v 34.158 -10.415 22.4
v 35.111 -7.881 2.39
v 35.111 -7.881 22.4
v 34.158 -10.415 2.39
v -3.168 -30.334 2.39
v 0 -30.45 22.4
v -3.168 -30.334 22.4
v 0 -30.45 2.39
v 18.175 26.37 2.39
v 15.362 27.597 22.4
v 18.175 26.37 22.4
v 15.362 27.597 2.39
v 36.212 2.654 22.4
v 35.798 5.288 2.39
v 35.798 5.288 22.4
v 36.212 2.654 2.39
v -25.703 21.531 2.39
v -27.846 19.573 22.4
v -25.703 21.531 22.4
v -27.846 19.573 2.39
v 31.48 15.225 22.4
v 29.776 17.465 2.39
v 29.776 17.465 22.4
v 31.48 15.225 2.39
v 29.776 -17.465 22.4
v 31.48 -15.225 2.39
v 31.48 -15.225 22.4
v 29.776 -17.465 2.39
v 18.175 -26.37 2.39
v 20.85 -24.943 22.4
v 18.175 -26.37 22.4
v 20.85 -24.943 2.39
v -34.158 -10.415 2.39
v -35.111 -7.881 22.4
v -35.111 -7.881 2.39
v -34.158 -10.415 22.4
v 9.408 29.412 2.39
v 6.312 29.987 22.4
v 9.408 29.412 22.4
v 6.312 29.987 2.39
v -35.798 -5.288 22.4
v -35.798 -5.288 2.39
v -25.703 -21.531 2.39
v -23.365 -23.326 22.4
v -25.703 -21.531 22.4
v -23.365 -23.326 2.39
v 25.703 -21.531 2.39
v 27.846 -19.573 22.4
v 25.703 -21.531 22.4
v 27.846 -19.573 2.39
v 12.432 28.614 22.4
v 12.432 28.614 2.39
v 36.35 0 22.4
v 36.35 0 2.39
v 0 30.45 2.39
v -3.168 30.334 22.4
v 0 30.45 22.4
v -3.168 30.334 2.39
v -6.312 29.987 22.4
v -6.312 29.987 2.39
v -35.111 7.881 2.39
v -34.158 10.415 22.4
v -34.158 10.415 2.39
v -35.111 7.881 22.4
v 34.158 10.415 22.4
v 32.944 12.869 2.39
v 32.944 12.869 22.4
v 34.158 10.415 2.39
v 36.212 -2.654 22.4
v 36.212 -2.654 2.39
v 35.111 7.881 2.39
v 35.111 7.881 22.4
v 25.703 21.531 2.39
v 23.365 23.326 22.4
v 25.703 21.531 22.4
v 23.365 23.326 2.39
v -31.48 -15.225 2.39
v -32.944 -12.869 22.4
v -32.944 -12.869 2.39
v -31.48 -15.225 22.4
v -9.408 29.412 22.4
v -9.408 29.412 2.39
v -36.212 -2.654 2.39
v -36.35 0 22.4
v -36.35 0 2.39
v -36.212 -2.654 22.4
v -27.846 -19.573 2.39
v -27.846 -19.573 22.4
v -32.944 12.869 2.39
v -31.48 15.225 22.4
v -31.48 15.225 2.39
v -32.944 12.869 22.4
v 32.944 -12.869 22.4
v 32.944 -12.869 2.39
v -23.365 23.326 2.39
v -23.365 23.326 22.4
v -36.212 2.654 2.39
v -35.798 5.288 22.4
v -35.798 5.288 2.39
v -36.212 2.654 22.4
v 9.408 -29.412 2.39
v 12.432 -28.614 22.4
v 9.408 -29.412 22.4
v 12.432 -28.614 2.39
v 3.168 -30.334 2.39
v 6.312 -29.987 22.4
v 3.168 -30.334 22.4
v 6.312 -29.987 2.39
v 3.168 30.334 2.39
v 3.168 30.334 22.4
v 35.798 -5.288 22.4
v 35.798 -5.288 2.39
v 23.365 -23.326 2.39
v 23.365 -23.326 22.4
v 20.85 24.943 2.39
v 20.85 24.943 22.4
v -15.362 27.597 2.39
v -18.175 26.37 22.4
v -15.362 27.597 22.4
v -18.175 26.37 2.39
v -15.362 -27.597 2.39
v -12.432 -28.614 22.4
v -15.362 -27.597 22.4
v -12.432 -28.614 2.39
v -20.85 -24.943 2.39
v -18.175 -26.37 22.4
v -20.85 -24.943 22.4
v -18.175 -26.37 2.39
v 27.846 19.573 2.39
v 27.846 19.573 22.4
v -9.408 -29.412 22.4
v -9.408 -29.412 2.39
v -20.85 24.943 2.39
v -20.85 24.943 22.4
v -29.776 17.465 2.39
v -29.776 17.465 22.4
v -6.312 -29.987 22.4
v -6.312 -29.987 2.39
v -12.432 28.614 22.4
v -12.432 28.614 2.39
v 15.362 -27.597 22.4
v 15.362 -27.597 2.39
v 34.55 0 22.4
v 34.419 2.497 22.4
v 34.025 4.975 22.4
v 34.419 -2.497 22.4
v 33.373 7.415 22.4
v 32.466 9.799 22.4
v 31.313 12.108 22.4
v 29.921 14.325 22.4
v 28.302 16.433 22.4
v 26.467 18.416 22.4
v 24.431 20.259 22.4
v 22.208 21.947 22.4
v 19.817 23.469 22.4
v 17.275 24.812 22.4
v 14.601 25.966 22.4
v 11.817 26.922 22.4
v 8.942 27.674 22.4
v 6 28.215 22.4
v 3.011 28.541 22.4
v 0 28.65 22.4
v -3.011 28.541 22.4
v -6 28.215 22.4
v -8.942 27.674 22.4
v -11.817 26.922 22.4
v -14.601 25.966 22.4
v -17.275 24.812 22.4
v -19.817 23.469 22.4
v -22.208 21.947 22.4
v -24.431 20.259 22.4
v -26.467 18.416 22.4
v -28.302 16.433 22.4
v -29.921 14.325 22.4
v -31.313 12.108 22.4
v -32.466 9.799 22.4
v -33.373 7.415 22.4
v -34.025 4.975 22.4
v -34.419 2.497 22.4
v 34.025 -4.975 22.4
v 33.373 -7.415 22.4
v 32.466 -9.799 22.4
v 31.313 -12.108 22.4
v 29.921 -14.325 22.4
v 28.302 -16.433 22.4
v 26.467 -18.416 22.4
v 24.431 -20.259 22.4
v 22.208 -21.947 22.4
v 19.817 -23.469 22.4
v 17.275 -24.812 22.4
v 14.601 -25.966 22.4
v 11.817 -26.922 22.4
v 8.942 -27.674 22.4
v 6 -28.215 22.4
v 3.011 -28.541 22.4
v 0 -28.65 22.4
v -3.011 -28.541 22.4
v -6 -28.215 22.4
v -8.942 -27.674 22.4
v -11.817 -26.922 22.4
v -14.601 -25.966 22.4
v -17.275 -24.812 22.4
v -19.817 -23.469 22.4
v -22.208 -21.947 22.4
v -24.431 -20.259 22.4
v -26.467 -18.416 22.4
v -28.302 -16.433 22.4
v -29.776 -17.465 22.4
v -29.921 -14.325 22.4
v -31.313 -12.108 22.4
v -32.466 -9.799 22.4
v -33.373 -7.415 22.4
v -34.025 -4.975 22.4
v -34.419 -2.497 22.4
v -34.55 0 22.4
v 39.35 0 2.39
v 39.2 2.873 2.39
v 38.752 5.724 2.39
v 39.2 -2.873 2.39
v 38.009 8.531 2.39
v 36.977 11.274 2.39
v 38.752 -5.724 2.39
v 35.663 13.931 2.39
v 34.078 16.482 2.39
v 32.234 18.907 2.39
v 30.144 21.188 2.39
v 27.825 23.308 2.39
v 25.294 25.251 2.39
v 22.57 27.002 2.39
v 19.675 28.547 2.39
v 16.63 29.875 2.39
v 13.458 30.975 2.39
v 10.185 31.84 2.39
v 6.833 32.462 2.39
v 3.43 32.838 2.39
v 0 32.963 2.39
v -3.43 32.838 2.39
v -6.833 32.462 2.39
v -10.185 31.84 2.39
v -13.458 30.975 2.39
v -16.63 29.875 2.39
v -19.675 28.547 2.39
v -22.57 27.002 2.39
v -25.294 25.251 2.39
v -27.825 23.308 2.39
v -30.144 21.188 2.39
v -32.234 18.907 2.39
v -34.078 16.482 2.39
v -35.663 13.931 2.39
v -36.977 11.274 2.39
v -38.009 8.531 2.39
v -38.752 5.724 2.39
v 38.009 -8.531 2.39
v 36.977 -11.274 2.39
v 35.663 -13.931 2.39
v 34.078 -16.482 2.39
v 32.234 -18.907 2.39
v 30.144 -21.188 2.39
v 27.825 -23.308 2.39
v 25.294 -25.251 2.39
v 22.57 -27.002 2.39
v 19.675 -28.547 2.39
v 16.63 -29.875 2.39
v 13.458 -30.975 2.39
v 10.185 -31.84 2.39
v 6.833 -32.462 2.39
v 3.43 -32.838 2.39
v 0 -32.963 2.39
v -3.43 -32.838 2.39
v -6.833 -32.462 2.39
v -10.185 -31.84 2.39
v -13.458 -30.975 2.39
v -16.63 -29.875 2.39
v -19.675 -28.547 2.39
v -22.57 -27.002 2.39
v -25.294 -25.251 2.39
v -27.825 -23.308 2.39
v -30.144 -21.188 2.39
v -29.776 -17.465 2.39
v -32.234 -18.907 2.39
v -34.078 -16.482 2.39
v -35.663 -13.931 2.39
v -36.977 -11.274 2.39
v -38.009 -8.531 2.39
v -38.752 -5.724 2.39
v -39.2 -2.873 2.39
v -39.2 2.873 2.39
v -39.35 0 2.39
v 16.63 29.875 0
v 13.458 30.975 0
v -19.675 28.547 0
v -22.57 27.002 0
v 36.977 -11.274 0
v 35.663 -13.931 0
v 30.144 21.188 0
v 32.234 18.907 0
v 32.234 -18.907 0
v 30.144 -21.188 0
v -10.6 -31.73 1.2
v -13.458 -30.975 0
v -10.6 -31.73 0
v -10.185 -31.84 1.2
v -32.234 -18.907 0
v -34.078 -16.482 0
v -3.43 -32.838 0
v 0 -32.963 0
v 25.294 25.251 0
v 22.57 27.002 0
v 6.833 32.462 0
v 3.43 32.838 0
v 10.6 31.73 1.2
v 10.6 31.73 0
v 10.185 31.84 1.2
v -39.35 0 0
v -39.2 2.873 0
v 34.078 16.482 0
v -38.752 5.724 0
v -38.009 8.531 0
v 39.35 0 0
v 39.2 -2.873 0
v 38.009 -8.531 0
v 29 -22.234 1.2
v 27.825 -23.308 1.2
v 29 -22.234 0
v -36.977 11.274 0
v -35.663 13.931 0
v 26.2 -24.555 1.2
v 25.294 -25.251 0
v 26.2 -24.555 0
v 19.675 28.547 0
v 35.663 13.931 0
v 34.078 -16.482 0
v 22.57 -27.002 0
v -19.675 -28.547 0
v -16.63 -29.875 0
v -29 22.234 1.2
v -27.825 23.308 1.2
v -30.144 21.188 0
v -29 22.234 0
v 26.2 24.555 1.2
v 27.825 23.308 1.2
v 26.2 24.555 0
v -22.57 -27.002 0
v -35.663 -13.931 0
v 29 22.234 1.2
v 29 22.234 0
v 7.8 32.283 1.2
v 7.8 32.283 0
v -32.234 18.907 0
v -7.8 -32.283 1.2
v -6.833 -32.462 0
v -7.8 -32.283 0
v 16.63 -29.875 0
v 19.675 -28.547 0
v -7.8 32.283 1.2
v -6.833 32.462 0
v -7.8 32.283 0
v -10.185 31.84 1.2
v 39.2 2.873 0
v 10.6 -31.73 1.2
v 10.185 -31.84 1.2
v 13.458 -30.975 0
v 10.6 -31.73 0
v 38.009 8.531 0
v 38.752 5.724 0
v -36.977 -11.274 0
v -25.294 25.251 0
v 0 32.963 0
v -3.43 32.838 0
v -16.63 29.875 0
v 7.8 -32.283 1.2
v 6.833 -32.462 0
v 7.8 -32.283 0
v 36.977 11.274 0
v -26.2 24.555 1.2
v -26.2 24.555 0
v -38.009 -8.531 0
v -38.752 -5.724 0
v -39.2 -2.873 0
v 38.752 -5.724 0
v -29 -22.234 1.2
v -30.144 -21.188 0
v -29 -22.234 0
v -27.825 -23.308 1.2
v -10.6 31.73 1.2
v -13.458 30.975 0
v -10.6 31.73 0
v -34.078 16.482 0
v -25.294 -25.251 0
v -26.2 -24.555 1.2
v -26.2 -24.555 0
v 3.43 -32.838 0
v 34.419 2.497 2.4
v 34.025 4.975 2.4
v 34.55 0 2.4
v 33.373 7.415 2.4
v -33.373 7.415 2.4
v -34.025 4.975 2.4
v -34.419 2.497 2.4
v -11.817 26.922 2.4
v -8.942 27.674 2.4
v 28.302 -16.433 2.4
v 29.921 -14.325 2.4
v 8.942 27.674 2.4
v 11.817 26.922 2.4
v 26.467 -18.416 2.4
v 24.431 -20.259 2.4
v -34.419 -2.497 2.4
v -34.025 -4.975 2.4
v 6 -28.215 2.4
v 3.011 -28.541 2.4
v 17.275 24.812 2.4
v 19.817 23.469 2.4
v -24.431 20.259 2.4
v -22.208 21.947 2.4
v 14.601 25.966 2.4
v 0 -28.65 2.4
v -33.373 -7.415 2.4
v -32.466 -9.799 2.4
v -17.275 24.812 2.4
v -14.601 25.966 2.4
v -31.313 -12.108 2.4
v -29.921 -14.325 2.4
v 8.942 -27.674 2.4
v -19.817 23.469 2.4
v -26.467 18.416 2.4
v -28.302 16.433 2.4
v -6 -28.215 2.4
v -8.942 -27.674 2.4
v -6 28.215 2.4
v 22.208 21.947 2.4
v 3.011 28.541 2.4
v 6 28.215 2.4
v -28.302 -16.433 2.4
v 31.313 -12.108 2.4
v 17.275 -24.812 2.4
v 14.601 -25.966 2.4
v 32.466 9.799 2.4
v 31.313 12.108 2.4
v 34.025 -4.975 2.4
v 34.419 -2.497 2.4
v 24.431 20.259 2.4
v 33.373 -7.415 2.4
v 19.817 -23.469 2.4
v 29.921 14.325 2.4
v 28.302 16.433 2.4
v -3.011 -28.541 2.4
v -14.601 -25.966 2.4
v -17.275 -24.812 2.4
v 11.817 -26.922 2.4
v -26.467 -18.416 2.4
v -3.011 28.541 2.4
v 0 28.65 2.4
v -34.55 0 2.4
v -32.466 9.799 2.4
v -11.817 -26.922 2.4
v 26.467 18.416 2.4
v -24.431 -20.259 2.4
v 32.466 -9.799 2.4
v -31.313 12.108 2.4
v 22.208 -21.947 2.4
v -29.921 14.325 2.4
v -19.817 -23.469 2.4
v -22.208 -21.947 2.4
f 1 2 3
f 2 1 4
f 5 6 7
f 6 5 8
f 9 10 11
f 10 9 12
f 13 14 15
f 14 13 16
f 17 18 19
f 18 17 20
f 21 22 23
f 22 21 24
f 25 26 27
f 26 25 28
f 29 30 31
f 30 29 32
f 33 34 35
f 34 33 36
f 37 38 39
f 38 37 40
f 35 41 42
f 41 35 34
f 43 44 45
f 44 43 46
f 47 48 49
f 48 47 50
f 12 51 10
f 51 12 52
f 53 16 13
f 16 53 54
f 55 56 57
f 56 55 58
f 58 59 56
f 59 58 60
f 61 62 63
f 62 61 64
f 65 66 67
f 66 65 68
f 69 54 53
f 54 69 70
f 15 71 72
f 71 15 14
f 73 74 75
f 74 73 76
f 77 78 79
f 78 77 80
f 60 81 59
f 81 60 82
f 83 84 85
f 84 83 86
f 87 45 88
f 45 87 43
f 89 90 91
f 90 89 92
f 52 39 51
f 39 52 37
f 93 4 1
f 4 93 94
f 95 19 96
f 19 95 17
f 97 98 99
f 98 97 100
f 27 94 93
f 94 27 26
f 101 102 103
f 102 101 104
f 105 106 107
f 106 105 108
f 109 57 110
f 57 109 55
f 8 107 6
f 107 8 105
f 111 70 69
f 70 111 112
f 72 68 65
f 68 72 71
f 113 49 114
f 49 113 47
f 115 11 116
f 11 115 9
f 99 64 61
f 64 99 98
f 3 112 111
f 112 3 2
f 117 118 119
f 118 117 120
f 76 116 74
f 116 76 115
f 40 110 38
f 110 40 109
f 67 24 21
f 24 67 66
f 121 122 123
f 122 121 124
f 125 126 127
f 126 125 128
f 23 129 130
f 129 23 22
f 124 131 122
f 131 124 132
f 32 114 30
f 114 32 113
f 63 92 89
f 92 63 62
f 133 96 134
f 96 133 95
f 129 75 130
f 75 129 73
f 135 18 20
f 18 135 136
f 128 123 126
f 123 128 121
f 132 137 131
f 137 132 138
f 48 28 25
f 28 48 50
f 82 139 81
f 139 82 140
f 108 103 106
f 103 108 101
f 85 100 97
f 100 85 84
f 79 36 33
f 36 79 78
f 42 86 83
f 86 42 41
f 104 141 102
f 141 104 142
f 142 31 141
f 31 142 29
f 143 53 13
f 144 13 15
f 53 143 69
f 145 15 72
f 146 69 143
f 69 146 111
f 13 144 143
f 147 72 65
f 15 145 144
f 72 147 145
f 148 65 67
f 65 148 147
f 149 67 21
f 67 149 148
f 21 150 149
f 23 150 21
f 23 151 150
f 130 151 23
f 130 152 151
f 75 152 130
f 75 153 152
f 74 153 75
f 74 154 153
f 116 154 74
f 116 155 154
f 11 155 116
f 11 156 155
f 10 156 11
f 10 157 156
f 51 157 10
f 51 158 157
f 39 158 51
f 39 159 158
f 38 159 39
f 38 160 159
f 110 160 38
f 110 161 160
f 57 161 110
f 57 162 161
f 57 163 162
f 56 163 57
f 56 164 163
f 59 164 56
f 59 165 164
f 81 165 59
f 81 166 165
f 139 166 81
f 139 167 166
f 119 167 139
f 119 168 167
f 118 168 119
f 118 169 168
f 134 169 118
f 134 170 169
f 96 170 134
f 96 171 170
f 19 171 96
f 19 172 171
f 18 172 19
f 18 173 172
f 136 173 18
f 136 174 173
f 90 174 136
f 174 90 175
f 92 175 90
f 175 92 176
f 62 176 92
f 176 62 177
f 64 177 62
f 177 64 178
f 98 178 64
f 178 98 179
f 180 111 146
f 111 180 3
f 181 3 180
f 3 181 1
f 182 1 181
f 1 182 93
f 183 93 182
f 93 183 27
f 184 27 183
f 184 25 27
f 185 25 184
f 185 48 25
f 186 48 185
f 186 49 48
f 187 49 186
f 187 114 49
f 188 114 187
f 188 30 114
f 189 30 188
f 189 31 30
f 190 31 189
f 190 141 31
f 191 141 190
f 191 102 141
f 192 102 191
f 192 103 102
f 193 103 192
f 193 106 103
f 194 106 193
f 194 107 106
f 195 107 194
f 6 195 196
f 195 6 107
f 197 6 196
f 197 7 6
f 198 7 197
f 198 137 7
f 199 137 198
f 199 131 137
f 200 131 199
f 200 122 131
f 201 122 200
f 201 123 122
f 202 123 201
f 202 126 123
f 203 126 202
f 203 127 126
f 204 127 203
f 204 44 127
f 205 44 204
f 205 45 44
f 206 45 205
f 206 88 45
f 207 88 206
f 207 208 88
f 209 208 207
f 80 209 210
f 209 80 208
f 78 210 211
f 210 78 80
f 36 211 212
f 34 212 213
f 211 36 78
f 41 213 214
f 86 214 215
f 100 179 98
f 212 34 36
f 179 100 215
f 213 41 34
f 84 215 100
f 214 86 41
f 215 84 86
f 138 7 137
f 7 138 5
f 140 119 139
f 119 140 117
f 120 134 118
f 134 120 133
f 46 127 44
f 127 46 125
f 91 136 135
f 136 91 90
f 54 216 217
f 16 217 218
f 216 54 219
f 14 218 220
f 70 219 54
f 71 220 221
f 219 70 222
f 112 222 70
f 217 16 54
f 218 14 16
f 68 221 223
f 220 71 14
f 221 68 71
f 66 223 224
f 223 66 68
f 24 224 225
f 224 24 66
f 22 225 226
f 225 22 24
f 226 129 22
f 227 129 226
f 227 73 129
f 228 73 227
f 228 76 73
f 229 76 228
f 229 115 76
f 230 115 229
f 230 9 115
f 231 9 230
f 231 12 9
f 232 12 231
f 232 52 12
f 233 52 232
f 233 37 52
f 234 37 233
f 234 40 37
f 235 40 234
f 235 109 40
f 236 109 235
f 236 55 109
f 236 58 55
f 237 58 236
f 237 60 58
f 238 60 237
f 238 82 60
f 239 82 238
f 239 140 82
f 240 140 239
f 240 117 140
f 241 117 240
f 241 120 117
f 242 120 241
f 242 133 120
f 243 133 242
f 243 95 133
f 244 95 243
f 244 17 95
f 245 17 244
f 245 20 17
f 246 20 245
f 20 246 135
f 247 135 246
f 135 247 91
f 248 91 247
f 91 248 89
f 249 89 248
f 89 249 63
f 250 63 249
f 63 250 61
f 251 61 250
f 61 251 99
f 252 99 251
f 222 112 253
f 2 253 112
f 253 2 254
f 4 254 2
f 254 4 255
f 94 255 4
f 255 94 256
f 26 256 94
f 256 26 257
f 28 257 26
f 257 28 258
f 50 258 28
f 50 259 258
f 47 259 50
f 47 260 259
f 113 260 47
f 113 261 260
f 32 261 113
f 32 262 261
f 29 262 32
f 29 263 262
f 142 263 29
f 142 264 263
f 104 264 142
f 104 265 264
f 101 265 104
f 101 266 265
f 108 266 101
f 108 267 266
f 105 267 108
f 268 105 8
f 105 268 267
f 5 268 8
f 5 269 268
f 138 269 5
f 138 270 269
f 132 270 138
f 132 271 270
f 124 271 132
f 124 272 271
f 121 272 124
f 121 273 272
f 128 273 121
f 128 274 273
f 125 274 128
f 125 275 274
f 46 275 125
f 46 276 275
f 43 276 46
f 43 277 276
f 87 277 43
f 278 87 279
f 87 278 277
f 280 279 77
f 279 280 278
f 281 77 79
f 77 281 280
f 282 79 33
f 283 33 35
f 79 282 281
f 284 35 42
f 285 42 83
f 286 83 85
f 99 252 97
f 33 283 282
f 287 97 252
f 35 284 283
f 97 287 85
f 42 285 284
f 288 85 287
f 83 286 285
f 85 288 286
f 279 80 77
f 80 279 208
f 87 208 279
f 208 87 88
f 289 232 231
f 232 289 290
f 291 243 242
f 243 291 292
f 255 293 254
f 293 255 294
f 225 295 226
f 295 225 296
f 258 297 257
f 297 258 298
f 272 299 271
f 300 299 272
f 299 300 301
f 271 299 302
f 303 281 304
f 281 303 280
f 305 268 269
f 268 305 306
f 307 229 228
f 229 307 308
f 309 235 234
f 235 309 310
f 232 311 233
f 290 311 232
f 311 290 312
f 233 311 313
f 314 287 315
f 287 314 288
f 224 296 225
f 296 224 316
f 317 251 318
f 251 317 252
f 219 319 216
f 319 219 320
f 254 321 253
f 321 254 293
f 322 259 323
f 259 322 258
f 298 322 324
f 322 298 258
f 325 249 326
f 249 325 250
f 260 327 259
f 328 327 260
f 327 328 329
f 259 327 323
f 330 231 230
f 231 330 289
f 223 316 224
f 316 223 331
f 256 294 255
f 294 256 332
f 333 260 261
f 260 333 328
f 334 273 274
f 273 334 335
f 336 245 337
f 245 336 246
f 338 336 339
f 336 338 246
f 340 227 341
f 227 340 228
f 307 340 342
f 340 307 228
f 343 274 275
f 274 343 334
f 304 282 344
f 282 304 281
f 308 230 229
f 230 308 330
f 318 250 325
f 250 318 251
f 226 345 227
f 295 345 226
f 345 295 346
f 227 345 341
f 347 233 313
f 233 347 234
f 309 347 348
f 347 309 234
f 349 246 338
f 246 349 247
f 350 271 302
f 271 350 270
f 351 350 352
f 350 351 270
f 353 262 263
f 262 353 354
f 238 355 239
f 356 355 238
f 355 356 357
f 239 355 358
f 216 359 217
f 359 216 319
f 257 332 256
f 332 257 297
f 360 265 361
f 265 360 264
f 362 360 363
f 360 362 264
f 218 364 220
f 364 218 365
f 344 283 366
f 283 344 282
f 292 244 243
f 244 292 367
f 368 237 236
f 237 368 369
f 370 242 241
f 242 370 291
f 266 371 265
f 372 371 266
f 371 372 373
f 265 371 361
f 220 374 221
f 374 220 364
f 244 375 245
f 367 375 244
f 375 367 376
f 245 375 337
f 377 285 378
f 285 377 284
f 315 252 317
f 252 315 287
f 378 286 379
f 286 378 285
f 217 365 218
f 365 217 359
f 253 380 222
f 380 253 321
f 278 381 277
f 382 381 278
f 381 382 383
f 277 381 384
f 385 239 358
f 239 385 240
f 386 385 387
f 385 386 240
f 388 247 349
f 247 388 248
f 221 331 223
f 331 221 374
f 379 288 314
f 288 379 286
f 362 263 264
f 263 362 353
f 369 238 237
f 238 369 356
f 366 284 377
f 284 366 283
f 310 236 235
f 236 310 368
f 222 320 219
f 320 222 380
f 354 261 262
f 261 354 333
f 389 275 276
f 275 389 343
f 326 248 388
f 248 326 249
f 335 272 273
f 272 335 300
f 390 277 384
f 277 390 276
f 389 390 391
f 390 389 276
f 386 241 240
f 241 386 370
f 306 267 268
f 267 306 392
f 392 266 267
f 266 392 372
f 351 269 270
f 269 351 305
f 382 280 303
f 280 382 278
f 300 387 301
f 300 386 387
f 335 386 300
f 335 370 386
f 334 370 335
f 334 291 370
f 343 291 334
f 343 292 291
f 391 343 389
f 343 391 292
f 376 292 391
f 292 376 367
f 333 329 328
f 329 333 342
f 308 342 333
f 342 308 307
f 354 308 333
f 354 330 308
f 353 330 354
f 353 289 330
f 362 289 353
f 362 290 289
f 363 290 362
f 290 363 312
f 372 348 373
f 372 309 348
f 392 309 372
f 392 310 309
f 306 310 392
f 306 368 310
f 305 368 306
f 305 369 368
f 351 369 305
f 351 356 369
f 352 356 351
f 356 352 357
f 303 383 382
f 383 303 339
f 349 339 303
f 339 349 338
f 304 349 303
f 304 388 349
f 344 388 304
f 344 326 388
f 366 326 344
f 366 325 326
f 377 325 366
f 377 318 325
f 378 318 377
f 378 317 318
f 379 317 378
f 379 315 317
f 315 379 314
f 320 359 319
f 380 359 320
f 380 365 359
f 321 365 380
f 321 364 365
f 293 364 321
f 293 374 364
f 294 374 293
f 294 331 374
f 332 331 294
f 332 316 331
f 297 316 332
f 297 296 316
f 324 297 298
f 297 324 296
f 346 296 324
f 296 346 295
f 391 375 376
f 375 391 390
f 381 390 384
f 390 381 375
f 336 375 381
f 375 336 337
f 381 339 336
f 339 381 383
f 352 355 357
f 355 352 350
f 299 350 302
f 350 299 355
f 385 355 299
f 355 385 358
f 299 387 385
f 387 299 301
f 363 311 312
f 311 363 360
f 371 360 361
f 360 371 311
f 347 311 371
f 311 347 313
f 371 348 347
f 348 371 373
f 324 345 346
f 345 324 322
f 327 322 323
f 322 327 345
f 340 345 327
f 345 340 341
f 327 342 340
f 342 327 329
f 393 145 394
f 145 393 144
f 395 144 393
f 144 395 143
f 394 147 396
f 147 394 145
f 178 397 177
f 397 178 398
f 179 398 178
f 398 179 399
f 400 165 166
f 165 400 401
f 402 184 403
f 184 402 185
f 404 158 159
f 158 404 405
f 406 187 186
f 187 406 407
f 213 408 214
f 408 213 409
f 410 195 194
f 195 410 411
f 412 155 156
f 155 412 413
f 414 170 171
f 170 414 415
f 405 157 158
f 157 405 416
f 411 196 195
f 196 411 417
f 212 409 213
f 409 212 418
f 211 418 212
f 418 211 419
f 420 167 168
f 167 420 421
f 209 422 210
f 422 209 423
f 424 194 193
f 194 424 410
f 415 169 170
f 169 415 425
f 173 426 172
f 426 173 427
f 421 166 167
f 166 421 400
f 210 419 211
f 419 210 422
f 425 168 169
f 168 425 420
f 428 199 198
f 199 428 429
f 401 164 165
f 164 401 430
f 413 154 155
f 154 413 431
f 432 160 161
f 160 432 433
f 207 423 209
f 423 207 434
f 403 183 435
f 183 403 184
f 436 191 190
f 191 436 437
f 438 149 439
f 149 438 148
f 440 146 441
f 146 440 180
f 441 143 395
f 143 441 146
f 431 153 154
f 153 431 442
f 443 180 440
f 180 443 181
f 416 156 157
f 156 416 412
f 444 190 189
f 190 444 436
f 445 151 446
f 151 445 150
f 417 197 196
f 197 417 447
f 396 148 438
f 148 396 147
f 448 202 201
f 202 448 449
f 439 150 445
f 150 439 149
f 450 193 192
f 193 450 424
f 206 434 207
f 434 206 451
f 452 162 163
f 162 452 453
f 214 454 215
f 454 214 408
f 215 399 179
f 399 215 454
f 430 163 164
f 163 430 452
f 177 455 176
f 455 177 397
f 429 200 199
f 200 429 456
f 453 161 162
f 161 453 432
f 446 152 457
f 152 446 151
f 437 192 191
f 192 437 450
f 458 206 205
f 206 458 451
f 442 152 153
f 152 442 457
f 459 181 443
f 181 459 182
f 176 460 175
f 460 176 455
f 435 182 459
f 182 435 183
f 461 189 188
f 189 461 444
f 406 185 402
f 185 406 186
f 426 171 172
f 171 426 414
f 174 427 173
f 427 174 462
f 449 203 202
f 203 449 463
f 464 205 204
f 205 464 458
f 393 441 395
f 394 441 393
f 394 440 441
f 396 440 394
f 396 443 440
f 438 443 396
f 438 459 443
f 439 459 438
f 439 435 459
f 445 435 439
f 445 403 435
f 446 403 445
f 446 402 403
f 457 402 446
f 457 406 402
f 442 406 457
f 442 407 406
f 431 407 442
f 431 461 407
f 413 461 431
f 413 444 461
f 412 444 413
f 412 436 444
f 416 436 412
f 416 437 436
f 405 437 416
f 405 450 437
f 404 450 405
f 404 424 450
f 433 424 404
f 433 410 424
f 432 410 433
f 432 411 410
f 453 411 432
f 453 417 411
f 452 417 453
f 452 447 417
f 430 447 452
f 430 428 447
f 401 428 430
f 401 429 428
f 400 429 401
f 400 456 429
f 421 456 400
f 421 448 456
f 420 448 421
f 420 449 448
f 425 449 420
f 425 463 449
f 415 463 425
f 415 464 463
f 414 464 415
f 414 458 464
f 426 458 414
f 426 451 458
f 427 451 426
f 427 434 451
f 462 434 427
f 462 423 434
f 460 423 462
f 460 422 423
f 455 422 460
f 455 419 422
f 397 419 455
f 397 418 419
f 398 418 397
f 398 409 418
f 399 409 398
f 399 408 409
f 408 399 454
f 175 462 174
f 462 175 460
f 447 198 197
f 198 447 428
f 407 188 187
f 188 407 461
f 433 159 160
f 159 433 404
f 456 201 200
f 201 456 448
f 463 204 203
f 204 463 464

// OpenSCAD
// -*- mode: SCAD ; c-file-style: "ellemtel" ; coding: utf-8 -*-
//
// A simple "coaster" to stop condiment bottles from falling over when
// placed on the bars of a the grid in the fridge
//
// (c) 2018 Roland Sieker <ospalh@gmail.com>
// Licence: CC-BY-SA 4.0


// Set this to "render" and click on "Create Thing" when done with the setup.
preview = 1; // [0:render, 1:preview]

// Distance from one bar of the fridge shelf grid to the next. All sizes are in millimetres.
bar_spacing = 18.4;  // [5:0.1:30]
// Diameter of one shelf grid bar
bar_width = 2.8;  // [0.5:0.1:7]
// Hight of the coaster pot.
pot_hight = 20;  // [3:0.5:50]
// Diameter of the bottle to hold
bottle_diameter_y = 56.5;  // [10:0.1:80]
bottle_diameter_x = 68.3;  // [10:0.1:80]
top_bottle_diameter_x = 56.5;  // [10:0.1:80]
// Width of the flange. How much the bottom is wider than the pot on top.
flange = 3;  // [0:0.5:15]

// How many same sized bottles to store in a row
number_of_pots = 1;  // [1:1:10]

/* [Hidden] */

// Done with the customizer

// *******************************************************
// Extra parameters. These can be changed reasonably safely.


w = 1.8;  // Wall width
p = 1.2;  // Bottom, top plate pot_hight
c = 0.4;  // Clearance
angle = 60; // Overhangs much below 60 degrees are a problem for me

// *******************************************************
// Some shortcuts. These shouldn't be changed

tau = 2 * PI;  // pi is still wrong. tau = circumference / r

xy_factor = 1/tan(angle);
// To get from a pot_hight to a horizontal width inclined correctly
z_factor = tan(angle);  // The other way around


riex = bottle_diameter_x/2 + c;
riey = bottle_diameter_y/2 + c;
ritx = bottle_diameter_x/2 + c;
factor_in = riey/riex;
factor_out = (riey+w)/(riex+w);



some_distance = 50;
ms = 0.01;  // Muggeseggele.

// fn for differently sized objects and fs, fa; all for preview or rendering.
pna = 40;
pnb = 15;
pa = 5;
ps = 1;
rna = 180;
rnb = 30;
ra = 1;
rs = 0.1;
function na() = (preview) ? pna : rna;
function nb() = (preview) ? pnb : rnb;
$fs = (preview) ? ps : rs;
$fa = (preview) ? pa : ra;

function fe() = (number_of_pots > 1) ? flange : 0;

// *******************************************************
// End setup



// *******************************************************
// Generate the parts

fridge_coaster();

// *******************************************************
// Code for the parts themselves


module fridge_coaster()
{
   hrc = ceil((riex+w+bar_width+flange)/bar_spacing) + 1;
   de = 2*riey+w;
   difference()
   {
      union()
      {
         for (o=[0:number_of_pots-1])
         {
            translate([0,o*de,2*p-ms])
            {
               scale([1,factor_out,1])
               {
                  cylinder(r1=riex+w, r2=ritx+w, h=pot_hight+ms);
               }
            }
         }
         hull ()
         {
            translate([0, fe(), 0])
            {
               scale([1,factor_out,1])
               {
                  cylinder(r=riex+w+flange, h=2*p-ms);
               }
            }
            translate([0, (number_of_pots-1)*de -fe(),0])
            {
               scale([1,factor_out,1])
               {
                  cylinder(r=riex+w+flange, h=2*p-ms);
               }
            }
         }
      }
      for (o=[0:number_of_pots-1])
      {  translate([0,o*de,2*p])
         {
            scale([1,factor_in,1])
            {
               cylinder(r1=riex, r2=ritx, h=pot_hight+2*ms);
            }
         }
      }
      for (o=[-hrc:hrc])
      {
         echo(o);
         translate([(o+0.5)*bar_spacing, (number_of_pots-1)*de*0.5, 0])
         {
            cube([bar_width, 2*(riex+w+c+bar_width+flange+ms)+(number_of_pots-1)*de, 2*p], center=true);
         }
      }
   }
}
